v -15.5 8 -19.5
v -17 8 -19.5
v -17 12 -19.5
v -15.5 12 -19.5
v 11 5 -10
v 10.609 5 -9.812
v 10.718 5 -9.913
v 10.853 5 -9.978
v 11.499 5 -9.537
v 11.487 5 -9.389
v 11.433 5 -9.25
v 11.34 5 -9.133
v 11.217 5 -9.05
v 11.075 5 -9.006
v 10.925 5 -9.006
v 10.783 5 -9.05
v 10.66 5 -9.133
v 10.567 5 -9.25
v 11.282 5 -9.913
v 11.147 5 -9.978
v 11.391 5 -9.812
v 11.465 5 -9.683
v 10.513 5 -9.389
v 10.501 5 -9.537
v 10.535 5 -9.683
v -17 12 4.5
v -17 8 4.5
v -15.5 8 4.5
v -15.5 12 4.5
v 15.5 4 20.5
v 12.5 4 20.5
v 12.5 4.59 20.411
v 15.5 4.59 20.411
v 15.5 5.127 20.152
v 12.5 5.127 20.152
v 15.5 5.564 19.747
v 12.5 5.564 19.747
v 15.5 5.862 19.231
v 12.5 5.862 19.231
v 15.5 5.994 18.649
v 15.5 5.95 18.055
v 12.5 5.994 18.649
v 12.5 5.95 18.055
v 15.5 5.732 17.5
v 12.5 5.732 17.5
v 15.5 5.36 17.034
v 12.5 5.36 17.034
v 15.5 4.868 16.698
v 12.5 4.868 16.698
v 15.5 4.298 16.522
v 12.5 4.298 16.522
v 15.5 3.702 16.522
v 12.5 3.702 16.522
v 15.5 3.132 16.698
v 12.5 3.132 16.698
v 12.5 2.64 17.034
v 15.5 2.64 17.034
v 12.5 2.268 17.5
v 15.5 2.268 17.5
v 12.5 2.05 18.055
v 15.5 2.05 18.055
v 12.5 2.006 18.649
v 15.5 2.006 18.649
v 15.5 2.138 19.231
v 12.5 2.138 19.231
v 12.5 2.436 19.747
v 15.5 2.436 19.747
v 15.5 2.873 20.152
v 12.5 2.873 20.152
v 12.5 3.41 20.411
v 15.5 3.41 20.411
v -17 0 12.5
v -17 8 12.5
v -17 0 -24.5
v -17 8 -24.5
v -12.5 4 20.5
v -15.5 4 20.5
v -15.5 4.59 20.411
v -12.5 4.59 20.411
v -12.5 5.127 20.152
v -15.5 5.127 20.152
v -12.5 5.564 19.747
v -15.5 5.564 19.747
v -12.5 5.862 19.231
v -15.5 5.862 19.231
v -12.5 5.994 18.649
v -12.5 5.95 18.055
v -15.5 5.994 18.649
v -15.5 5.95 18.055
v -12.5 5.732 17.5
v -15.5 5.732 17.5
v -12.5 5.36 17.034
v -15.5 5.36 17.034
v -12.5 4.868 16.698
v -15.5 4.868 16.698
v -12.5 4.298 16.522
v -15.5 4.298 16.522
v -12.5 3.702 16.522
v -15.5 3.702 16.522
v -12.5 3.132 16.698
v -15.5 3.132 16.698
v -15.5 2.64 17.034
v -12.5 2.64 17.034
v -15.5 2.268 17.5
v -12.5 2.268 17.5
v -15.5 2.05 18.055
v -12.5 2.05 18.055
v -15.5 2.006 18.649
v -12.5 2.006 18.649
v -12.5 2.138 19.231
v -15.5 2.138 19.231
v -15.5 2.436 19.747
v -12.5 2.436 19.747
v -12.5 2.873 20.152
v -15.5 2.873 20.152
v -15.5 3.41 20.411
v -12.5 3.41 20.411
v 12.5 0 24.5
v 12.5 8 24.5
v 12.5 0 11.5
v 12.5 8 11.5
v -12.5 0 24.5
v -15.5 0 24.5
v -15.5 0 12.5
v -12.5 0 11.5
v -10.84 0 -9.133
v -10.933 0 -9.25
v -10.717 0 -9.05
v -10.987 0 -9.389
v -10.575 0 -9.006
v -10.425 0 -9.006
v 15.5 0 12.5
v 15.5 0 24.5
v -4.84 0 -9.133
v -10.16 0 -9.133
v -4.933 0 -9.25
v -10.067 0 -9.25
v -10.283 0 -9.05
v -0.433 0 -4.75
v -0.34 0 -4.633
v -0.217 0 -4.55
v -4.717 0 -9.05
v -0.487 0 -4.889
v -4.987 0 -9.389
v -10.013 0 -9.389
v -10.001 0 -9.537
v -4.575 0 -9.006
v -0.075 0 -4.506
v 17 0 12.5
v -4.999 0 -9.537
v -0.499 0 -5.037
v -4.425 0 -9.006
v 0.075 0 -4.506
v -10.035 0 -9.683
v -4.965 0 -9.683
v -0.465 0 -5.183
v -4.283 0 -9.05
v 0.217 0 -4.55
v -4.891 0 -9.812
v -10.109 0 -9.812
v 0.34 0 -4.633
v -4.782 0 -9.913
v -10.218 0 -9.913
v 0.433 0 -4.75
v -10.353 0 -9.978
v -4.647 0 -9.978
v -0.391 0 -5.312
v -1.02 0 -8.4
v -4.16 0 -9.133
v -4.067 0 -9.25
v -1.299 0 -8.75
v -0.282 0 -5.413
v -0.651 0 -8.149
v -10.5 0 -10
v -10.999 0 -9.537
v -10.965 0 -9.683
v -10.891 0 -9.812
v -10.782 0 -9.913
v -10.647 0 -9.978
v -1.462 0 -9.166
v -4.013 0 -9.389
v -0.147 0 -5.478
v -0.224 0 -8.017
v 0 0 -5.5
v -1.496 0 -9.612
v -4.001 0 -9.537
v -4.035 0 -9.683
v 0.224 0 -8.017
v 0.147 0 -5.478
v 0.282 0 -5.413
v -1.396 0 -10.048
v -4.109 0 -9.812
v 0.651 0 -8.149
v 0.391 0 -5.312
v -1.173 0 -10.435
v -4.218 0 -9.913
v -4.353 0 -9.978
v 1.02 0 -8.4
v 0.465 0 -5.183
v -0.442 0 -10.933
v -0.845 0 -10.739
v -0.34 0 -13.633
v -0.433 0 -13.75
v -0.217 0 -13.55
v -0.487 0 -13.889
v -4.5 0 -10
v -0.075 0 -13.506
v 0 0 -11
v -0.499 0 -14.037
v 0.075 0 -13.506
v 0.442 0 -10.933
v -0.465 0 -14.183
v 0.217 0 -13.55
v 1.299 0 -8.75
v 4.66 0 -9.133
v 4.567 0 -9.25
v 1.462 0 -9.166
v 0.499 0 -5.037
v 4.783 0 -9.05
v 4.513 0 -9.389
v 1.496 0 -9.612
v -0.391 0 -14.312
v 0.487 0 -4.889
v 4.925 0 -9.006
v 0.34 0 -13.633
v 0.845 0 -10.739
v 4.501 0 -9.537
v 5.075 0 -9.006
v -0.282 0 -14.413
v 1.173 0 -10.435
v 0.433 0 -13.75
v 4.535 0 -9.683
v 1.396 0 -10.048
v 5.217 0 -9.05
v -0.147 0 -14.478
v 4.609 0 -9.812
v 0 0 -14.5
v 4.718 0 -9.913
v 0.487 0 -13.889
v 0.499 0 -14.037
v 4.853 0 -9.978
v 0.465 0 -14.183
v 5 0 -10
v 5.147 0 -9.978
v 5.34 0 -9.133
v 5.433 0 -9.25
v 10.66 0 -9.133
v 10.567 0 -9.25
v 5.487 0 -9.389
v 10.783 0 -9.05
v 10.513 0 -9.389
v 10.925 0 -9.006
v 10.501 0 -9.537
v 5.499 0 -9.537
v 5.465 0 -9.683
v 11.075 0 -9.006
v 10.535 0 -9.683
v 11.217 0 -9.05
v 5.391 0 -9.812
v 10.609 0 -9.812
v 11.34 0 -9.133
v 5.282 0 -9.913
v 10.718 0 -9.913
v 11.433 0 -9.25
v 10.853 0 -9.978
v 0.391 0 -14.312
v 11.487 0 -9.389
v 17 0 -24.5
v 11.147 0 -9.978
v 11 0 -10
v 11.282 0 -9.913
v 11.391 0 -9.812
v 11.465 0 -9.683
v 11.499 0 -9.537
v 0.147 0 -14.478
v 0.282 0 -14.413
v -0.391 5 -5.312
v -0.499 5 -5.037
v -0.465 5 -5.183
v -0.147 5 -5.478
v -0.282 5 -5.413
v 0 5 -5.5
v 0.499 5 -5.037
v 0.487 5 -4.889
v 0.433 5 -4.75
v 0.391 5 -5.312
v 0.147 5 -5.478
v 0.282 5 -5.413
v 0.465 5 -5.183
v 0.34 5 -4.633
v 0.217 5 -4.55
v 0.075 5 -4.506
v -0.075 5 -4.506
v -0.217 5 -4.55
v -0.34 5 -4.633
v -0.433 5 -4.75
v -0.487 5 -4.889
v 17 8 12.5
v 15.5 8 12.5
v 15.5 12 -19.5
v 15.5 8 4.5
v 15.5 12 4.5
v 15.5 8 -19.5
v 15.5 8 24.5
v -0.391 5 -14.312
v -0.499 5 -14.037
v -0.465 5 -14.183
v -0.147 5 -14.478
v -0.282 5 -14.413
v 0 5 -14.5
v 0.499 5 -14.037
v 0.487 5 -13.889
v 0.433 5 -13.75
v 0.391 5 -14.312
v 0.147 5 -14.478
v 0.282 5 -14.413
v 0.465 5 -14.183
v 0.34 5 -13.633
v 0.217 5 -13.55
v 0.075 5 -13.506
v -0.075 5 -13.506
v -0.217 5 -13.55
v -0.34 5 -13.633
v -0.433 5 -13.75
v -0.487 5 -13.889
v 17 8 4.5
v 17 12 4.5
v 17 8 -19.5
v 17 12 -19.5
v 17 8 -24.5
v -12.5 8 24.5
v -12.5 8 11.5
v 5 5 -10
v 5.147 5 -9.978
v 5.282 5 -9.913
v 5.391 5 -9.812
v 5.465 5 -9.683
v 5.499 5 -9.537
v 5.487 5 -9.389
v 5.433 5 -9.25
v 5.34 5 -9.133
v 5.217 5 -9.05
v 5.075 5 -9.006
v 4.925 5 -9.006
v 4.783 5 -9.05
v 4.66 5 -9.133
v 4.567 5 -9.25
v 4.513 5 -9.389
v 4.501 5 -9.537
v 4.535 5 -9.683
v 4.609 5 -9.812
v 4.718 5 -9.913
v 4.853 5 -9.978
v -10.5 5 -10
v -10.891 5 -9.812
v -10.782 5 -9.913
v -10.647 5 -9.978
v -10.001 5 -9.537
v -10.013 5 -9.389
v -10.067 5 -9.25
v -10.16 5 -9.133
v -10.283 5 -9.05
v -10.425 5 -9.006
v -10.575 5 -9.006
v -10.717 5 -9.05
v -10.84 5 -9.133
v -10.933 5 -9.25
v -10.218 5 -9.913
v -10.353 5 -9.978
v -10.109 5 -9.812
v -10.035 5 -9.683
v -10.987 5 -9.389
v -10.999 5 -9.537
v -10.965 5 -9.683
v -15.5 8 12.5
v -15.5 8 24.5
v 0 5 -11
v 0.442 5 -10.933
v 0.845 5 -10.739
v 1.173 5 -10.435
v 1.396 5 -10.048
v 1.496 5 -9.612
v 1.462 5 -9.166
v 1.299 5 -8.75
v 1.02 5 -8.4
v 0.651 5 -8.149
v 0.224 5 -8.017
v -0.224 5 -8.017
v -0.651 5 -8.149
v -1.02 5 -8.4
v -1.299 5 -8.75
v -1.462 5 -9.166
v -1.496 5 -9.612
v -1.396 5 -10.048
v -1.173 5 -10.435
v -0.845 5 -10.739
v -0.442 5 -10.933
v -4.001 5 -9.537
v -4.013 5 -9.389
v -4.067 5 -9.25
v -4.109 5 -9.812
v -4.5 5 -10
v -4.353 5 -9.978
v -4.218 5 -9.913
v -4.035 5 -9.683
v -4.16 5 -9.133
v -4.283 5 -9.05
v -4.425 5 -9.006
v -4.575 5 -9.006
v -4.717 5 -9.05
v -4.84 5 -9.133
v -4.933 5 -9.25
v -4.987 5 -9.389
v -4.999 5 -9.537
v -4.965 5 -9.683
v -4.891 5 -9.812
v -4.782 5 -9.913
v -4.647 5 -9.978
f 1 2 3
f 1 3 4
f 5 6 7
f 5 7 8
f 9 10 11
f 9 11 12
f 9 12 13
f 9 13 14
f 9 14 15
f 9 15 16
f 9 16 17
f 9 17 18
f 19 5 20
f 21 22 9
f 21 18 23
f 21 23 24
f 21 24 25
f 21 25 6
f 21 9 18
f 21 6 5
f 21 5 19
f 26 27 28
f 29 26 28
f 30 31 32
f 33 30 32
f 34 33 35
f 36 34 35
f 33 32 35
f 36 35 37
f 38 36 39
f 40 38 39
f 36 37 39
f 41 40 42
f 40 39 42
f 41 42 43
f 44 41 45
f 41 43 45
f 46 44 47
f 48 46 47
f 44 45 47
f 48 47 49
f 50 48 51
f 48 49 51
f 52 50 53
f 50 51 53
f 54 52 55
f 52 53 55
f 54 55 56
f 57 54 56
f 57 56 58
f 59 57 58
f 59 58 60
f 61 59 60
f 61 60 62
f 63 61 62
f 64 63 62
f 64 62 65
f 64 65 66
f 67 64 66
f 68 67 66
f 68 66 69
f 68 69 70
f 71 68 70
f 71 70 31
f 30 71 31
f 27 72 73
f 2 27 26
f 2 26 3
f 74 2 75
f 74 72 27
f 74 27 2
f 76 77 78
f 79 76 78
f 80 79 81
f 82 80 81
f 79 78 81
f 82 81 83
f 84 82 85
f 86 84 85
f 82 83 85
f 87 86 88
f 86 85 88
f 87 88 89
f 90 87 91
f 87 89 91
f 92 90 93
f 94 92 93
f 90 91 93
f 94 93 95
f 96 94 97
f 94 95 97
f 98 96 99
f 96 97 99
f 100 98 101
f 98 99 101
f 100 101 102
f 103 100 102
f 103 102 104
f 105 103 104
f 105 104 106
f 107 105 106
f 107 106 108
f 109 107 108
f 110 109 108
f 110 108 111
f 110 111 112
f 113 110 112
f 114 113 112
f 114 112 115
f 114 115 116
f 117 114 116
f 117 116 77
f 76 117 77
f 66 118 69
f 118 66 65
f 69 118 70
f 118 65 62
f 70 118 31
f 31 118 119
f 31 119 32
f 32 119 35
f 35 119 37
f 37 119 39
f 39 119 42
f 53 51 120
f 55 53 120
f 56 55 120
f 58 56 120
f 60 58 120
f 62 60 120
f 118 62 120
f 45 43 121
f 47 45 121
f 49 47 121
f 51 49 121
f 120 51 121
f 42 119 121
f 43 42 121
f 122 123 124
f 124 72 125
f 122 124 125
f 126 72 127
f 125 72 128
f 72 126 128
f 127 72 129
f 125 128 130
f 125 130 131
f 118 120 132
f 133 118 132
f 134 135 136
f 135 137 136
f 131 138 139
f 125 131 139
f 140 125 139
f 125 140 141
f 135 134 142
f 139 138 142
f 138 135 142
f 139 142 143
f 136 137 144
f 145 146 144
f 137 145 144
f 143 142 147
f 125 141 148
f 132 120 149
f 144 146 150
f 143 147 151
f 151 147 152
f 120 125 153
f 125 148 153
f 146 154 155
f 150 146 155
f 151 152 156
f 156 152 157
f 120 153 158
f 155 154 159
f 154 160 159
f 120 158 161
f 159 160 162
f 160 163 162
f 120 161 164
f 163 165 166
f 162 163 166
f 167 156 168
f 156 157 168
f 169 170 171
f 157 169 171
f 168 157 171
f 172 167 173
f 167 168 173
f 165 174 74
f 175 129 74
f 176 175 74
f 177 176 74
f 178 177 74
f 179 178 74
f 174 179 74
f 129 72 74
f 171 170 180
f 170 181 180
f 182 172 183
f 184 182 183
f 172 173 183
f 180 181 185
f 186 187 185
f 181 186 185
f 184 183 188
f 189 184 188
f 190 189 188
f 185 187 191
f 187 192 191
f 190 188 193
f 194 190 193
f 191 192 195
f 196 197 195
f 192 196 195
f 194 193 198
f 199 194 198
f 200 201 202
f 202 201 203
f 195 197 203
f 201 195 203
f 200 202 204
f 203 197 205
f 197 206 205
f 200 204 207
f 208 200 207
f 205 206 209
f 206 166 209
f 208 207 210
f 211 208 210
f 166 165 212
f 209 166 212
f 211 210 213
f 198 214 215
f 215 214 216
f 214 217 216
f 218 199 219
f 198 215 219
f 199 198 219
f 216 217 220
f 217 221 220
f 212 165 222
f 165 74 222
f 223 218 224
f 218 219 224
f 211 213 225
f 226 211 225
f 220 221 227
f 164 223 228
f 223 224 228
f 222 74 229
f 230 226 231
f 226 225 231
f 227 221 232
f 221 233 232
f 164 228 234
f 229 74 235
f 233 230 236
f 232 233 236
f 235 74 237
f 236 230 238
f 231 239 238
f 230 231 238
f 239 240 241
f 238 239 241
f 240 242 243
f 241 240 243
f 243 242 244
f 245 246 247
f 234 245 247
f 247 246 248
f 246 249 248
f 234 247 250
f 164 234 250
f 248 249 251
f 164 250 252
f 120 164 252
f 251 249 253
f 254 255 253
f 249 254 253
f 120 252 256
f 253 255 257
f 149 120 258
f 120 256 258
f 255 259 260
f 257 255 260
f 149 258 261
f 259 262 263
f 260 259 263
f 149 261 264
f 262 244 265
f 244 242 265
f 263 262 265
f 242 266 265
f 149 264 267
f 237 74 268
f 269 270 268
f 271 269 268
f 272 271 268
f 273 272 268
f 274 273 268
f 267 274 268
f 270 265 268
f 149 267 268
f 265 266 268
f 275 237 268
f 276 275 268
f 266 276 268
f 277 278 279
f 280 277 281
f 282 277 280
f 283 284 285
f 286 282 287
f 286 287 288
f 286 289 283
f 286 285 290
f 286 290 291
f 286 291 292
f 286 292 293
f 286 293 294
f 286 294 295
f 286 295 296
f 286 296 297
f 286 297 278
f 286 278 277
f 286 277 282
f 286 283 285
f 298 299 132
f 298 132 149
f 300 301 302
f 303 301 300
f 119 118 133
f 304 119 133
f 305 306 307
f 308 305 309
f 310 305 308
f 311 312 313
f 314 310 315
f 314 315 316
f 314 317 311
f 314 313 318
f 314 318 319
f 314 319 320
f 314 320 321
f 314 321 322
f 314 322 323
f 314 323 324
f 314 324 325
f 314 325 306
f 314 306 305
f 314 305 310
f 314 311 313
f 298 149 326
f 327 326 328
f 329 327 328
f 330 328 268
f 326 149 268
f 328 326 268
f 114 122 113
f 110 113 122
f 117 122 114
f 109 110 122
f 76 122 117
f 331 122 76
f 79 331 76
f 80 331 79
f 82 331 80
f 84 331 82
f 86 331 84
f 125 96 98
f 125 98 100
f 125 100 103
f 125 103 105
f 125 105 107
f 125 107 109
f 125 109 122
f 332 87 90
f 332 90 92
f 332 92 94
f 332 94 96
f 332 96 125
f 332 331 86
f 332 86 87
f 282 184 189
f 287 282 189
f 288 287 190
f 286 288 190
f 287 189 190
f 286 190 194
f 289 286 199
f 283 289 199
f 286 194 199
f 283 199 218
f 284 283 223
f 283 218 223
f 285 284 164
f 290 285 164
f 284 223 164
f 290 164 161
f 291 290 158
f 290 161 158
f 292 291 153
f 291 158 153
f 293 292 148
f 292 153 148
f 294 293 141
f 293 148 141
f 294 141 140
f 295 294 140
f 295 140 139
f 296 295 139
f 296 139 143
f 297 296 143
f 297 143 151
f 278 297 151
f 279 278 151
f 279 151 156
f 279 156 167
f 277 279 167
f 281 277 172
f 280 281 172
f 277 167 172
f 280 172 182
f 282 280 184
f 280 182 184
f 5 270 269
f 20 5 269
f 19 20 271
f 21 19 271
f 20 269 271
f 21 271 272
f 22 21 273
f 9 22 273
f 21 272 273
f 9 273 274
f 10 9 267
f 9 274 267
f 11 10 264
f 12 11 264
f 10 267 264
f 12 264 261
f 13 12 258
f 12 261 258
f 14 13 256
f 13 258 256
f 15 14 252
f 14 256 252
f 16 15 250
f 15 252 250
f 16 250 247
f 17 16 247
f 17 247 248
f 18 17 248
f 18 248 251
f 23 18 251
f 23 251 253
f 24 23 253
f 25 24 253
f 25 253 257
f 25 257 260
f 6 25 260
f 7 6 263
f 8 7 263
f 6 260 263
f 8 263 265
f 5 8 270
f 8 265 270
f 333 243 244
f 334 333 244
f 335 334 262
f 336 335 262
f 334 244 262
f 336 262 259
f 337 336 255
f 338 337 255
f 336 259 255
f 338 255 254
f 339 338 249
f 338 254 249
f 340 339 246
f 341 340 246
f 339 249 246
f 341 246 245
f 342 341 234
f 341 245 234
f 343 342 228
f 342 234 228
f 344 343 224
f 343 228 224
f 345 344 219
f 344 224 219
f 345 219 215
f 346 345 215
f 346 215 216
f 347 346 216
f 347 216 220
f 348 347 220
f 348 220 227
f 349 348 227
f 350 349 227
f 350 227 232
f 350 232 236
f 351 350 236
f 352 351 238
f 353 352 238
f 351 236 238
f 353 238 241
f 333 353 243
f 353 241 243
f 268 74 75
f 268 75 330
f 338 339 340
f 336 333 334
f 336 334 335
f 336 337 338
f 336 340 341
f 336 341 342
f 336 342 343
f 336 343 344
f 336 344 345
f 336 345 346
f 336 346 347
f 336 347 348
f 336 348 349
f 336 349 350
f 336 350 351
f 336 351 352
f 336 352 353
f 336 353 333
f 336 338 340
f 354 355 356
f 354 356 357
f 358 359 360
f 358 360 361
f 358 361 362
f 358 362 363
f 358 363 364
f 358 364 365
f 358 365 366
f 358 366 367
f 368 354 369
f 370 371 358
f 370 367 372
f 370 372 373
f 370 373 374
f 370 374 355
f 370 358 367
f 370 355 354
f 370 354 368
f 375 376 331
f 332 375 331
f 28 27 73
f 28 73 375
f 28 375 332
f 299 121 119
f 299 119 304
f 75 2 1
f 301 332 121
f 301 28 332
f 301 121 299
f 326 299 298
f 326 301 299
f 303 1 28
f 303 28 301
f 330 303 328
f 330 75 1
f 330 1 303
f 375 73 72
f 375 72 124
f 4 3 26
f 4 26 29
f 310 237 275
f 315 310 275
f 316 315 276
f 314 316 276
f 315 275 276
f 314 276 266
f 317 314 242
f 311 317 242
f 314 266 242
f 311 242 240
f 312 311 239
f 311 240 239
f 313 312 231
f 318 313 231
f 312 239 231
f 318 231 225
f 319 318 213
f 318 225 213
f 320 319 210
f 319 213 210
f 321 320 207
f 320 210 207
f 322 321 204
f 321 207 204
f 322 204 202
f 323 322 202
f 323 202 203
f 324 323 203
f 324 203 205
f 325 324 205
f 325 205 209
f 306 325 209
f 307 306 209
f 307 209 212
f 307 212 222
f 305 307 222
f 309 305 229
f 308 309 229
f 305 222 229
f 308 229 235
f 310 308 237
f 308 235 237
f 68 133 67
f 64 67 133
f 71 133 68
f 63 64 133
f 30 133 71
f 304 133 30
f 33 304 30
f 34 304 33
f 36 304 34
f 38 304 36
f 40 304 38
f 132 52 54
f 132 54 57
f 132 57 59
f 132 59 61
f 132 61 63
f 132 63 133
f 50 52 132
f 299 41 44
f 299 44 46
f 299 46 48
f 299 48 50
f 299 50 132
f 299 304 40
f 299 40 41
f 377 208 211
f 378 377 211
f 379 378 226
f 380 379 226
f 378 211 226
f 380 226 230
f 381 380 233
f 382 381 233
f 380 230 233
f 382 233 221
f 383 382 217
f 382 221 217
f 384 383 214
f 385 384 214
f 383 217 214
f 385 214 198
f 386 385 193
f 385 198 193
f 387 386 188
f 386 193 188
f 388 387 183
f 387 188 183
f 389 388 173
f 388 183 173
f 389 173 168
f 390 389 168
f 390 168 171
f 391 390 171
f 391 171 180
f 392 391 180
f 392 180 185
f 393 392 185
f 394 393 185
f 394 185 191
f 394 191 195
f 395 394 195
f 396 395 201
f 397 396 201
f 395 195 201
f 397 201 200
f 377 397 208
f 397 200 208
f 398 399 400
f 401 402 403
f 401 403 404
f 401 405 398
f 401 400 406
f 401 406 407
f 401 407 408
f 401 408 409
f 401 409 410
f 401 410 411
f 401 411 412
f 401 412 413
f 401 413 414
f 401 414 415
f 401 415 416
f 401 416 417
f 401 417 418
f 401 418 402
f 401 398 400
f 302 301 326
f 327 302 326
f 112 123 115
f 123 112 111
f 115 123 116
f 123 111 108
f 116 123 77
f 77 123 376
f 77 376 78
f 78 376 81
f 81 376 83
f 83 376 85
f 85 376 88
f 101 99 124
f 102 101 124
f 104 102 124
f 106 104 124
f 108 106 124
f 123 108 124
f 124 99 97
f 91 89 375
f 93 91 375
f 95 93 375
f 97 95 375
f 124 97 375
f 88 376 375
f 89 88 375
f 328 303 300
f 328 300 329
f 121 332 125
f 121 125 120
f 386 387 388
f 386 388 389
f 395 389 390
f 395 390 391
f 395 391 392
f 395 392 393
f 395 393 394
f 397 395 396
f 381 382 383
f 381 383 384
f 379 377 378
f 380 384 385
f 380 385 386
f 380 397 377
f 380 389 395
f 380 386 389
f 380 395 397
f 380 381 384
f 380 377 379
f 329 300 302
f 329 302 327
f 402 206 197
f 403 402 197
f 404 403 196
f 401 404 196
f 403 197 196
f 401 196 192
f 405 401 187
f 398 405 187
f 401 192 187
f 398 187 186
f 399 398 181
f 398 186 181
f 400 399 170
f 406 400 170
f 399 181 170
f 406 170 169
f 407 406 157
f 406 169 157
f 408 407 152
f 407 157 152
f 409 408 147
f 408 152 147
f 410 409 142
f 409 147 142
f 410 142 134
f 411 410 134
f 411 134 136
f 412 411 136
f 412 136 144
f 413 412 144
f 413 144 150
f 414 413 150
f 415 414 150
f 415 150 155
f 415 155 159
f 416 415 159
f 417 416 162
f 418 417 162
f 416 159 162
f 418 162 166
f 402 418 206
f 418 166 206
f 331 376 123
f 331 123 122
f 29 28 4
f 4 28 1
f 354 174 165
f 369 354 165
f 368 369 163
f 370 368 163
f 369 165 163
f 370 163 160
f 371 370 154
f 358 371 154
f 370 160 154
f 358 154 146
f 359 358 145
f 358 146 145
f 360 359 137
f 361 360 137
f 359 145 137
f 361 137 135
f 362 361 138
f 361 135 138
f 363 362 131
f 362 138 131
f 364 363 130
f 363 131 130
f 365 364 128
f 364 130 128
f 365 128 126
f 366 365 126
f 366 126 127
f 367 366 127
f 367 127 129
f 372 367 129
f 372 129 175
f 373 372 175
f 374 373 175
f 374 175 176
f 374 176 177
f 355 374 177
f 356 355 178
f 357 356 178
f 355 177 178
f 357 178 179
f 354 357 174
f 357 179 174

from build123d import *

# Parameters (mm, degrees)
SKETCH_1_W          = 34
SKETCH_1_H          = 49
EXTRUDE_1_DEPTH     = 8
SKETCH_2_W          = 1.5
SKETCH_2_H          = 24
EXTRUDE_2_DEPTH     = 4
SKETCH_3_W          = 1.5
SKETCH_3_H          = 12
SKETCH_3_W_2        = 25
SKETCH_3_H_2        = 13
CUT_EXTRUDE_1_DEPTH = 8
CUT_EXTRUDE_2_REACH = 44.432
SKETCH_4_R          = 2
EXTRUDE_3_DEPTH     = 8
SKETCH_6_R          = 1.5
SKETCH_6_R_2        = 0.5
CUT_EXTRUDE_3_DEPTH = 5
CUT_EXTRUDE_4_DEPTH = 8


with BuildPart() as part:
    # 草图1 → 凸台-拉伸1 (new body)
    with BuildSketch(Plane(origin=(0, 0, 0), x_dir=(1, 0, 0), z_dir=(0, 1, 0))):
        Rectangle(SKETCH_1_W, SKETCH_1_H)
    extrude(amount=EXTRUDE_1_DEPTH)

    # 草图2 → 凸台-拉伸2 (add)
    with BuildSketch(Plane(origin=(0, 8, 0), x_dir=(1, 0, 0), z_dir=(0, 1, 0))):
        with Locations((-16.25, 7.5)):
            Rectangle(SKETCH_2_W, SKETCH_2_H)
        with Locations((16.25, 7.5)):
            Rectangle(SKETCH_2_W, SKETCH_2_H)
    extrude(amount=EXTRUDE_2_DEPTH)

    # 草图3 → 切除-拉伸1 (cut)
    with BuildSketch(Plane(origin=(0, 8, 0), x_dir=(1, 0, 0), z_dir=(0, 1, 0))):
        with Locations((-16.25, -18.5)):
            Rectangle(SKETCH_3_W, SKETCH_3_H)
        with Locations((16.25, -18.5)):
            Rectangle(SKETCH_3_W, SKETCH_3_H)
        with Locations((0, -18)):
            Rectangle(SKETCH_3_W_2, SKETCH_3_H_2)
    extrude(amount=-CUT_EXTRUDE_1_DEPTH, mode=Mode.SUBTRACT)

    # 切除-拉伸2: up to this face of the body (flat: up to its plane)
    cut_extrude_2_end = Plane(part.part.faces().sort_by_distance((15.5, 4, 18.5))[0])
    # 草图4 → 切除-拉伸2 (cut, up to the picked face)
    with BuildSketch(Plane.ZY.offset(15.5), mode=Mode.PRIVATE) as cut_extrude_2_sk1:
        with Locations((18.5, 4)):
            Circle(SKETCH_4_R)
    cut_extrude_2_tool1 = split(extrude(cut_extrude_2_sk1.sketch, amount=-CUT_EXTRUDE_2_REACH, mode=Mode.PRIVATE), bisect_by=cut_extrude_2_end, keep=Keep.BOTH, mode=Mode.PRIVATE)
    add(cut_extrude_2_tool1.solids().sort_by(Axis((-15.5, 4, 18.5), (1, 0, 0)))[0], mode=Mode.SUBTRACT)

    # 草图5 → 凸台-拉伸3 (add)
    with BuildSketch(Plane.XZ):
        Polygon((4, 11.5), (-4, 11.5), (-4, 41.5), (-13, 41.5), (-13, 56.5), (13, 56.5), (13, 41.5), (4, 41.5), align=None)
    extrude(amount=-EXTRUDE_3_DEPTH)

    # 草图6 → 切除-拉伸3 (cut)
    with BuildSketch(Plane.XZ):
        with Locations(Location((0, -9.5, 0), (0, 0, 270))):
            Circle(SKETCH_6_R)
        with Locations(Location((5, -9.5, 0), (0, 0, 270))):
            Circle(SKETCH_6_R_2)
        with Locations(Location((11, -9.5, 0), (0, 0, 270))):
            Circle(SKETCH_6_R_2)
        with Locations(Location((-4.5, -9.5, 0), (0, 0, 270))):
            Circle(SKETCH_6_R_2)
        with Locations(Location((-10.5, -9.5, 0), (0, 0, 270))):
            Circle(SKETCH_6_R_2)
        with Locations(Location((0, -14, 0), (0, 0, 270))):
            Circle(SKETCH_6_R_2)
        with Locations(Location((0, -5, 0), (0, 0, 270))):
            Circle(SKETCH_6_R_2)
    extrude(amount=-CUT_EXTRUDE_3_DEPTH, mode=Mode.SUBTRACT)

    # 草图5<2> → 切除-拉伸4 (cut)
    with BuildSketch(Plane.XZ):
        Polygon((4, 11.5), (-4, 11.5), (-4, 41.5), (-13, 41.5), (-13, 56.5), (13, 56.5), (13, 41.5), (4, 41.5), align=None)
    extrude(amount=-CUT_EXTRUDE_4_DEPTH, mode=Mode.SUBTRACT)


solid = part.part
